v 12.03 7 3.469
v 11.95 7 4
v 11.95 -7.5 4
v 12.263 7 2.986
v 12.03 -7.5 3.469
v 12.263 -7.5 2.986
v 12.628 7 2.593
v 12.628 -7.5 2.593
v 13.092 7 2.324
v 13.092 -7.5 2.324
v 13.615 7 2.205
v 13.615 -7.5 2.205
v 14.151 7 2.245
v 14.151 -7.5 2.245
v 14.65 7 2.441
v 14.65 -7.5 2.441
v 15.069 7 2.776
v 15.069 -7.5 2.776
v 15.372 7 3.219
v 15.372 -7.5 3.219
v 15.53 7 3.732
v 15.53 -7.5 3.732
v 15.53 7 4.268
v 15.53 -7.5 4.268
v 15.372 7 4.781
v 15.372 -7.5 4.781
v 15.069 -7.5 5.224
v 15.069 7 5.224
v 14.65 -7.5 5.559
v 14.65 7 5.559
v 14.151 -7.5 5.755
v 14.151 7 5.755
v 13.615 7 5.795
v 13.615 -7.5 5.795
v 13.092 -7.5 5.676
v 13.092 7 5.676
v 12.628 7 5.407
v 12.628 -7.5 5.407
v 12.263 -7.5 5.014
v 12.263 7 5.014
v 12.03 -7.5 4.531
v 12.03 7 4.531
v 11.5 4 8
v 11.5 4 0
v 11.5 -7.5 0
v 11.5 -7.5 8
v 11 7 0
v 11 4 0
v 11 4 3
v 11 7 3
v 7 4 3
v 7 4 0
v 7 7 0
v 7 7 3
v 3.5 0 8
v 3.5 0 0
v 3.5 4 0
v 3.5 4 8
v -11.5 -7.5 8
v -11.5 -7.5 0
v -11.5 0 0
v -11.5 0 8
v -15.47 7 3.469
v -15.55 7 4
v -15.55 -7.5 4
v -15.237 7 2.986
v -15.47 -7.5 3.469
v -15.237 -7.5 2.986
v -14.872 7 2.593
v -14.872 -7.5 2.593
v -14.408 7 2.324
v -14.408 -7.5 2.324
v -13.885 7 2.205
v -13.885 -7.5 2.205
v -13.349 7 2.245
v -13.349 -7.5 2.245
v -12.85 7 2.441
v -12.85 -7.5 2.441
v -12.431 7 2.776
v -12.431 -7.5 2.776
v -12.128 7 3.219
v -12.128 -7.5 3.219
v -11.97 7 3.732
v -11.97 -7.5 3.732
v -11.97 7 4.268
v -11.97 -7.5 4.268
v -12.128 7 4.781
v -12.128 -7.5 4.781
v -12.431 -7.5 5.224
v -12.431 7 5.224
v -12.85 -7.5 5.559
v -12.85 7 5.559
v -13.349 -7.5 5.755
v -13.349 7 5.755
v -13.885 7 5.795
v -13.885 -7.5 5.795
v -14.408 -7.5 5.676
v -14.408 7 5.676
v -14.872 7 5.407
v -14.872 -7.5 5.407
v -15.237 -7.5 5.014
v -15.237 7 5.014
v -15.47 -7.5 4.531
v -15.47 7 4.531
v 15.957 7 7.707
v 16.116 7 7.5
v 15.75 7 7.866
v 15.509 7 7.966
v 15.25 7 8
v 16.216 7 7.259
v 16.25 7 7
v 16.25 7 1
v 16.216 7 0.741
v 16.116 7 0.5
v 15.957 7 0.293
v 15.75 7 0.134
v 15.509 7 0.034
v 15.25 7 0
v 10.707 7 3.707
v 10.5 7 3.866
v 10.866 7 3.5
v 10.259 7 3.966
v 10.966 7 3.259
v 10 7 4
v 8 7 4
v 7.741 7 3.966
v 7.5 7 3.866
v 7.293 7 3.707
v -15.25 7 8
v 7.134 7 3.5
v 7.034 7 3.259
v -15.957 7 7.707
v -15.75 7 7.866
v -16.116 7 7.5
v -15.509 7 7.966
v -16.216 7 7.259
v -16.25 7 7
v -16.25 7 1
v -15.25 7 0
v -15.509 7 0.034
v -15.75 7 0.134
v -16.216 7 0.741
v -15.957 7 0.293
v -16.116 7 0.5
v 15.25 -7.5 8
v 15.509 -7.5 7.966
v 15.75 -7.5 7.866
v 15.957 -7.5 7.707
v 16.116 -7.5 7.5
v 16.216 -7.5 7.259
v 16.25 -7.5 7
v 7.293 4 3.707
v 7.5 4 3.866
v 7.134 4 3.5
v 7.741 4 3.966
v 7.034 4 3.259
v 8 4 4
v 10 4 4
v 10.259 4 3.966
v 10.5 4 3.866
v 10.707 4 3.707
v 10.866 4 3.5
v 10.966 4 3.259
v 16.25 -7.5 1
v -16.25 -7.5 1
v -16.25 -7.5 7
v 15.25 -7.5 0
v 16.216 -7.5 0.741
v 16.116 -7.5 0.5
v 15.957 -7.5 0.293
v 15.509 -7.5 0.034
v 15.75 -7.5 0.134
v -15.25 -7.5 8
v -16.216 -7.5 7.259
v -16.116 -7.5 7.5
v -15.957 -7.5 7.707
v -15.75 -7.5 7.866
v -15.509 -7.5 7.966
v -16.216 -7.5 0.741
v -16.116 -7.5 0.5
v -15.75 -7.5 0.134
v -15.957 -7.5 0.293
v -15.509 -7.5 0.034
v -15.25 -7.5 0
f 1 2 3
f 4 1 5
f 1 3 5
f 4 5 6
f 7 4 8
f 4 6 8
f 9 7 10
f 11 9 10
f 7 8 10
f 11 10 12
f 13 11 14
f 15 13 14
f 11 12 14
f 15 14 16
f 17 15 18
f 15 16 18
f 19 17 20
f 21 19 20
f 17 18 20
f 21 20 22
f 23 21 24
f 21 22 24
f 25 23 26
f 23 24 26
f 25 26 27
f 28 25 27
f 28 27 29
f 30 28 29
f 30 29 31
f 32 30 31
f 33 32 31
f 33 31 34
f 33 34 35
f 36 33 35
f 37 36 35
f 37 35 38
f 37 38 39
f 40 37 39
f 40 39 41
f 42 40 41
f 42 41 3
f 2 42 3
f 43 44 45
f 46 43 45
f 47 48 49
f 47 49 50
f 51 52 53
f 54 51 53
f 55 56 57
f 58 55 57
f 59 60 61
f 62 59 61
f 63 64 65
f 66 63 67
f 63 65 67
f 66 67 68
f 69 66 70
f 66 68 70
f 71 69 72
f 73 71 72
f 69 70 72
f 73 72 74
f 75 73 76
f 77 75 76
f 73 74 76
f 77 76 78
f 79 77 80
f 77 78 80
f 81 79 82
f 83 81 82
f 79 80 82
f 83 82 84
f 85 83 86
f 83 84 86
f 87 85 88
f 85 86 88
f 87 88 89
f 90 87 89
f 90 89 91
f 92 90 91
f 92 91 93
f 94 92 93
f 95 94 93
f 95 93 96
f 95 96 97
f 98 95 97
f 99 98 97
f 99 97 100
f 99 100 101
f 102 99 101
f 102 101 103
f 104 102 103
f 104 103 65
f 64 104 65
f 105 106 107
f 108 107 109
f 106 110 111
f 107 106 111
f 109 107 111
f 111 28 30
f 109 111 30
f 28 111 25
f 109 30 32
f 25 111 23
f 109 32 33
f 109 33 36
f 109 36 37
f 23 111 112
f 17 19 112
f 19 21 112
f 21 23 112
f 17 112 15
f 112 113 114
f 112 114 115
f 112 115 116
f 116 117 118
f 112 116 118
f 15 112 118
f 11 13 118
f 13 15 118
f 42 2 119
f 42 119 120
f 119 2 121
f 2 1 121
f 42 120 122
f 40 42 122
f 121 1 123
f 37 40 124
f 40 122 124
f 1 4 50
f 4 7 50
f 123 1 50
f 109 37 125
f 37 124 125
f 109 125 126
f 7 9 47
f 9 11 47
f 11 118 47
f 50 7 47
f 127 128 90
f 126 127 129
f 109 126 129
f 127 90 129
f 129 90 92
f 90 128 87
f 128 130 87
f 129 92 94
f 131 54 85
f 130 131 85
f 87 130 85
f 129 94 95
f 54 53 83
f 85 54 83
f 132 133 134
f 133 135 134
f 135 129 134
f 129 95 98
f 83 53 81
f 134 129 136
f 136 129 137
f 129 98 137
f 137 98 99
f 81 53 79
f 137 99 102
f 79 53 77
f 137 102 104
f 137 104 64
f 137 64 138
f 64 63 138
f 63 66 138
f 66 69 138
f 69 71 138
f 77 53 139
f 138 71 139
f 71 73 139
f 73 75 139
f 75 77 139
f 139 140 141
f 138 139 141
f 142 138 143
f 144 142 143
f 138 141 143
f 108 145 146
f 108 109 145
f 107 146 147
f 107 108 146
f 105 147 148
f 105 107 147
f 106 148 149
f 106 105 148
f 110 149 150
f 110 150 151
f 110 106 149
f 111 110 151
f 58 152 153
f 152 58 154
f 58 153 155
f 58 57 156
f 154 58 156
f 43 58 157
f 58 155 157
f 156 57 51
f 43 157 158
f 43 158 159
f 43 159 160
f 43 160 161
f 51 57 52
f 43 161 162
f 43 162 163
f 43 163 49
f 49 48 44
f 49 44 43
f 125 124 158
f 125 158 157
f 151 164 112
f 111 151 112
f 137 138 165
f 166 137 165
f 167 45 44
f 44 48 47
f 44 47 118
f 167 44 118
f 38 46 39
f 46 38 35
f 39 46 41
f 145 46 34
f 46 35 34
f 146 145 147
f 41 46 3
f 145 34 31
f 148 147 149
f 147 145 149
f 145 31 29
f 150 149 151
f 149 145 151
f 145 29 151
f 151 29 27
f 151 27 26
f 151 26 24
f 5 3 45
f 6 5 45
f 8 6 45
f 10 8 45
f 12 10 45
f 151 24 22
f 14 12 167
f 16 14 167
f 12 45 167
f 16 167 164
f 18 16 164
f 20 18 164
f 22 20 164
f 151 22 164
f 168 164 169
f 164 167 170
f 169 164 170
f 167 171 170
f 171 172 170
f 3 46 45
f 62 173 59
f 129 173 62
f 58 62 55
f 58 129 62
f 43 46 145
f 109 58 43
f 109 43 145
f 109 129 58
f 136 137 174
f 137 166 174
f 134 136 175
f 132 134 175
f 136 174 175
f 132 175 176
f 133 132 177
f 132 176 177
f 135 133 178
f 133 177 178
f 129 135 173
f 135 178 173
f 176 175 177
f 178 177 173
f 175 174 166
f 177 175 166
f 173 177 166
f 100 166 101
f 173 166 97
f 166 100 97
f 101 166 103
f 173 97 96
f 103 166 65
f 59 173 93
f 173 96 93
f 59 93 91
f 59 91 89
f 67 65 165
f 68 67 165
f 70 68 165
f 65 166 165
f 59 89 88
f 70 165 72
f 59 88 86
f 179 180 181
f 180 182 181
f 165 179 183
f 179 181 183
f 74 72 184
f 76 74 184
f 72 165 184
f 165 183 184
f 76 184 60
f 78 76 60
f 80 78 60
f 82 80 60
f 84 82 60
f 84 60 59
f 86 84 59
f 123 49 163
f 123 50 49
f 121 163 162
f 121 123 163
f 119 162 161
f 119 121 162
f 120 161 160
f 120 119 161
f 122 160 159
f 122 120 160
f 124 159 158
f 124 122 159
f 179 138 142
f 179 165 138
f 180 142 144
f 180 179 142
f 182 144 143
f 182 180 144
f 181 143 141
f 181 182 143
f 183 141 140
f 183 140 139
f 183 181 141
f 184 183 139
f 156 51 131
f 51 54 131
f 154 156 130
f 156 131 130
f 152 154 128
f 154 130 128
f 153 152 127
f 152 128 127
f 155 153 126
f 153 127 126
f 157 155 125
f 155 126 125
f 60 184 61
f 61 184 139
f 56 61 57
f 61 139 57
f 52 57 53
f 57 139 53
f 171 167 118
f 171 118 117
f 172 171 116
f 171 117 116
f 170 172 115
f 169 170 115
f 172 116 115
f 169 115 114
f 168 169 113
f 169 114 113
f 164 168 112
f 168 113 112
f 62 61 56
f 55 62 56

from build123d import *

# Parameters (mm, degrees)
BOSS_EXTRUDE1_DEPTH  = 8
M3_CLEARANCE_HOLE1_D = 3.6
FILLET1_R            = 1
SKETCH5_W            = 4
SKETCH5_H            = 7
CUT_EXTRUDE1_DEPTH   = 4
FILLET2_R            = 1


with BuildPart() as part:
    # Sketch1 → Boss-Extrude1 (new body)
    with BuildSketch(Plane.XY):
        Polygon((-16.25, -7.5), (-11.5, -7.5), (-11.5, 0), (3.5, 0), (3.5, 4), (11.5, 4), (11.5, -7.5), (16.25, -7.5), (16.25, 7), (-16.25, 7), align=None)
    extrude(amount=BOSS_EXTRUDE1_DEPTH)

    # M3 Clearance Hole1 (through all)
    with Locations(Plane(origin=(0, 7, 0), x_dir=(1, 0, 0), z_dir=(0, 1, 0))):
        with Locations((13.75, -4), (-13.75, -4)):
            Hole(M3_CLEARANCE_HOLE1_D / 2)

    # Fillet1
    fillet1_edges = [part.edges().sort_by_distance(p)[0] for p in [
        (-16.25, -0.25, 8),
        (-16.25, -0.25, 0),
        (16.25, -0.25, 0),
        (16.25, -0.25, 8),
    ]]
    fillet(fillet1_edges, radius=FILLET1_R)

    # Sketch5 → Cut-Extrude1 (cut)
    with BuildSketch(Plane(origin=(0, 0, 0), x_dir=(-1, 0, 0), z_dir=(0, 0, -1))):
        with Locations((-9, 3.5)):
            Rectangle(SKETCH5_W, SKETCH5_H)
    extrude(amount=-CUT_EXTRUDE1_DEPTH, mode=Mode.SUBTRACT)

    # Fillet2
    fillet2_edges = [part.edges().sort_by_distance(p)[0] for p in [
        (11, 5.5, 4),
        (7, 5.5, 4),
    ]]
    fillet(fillet2_edges, radius=FILLET2_R)


solid = part.part
